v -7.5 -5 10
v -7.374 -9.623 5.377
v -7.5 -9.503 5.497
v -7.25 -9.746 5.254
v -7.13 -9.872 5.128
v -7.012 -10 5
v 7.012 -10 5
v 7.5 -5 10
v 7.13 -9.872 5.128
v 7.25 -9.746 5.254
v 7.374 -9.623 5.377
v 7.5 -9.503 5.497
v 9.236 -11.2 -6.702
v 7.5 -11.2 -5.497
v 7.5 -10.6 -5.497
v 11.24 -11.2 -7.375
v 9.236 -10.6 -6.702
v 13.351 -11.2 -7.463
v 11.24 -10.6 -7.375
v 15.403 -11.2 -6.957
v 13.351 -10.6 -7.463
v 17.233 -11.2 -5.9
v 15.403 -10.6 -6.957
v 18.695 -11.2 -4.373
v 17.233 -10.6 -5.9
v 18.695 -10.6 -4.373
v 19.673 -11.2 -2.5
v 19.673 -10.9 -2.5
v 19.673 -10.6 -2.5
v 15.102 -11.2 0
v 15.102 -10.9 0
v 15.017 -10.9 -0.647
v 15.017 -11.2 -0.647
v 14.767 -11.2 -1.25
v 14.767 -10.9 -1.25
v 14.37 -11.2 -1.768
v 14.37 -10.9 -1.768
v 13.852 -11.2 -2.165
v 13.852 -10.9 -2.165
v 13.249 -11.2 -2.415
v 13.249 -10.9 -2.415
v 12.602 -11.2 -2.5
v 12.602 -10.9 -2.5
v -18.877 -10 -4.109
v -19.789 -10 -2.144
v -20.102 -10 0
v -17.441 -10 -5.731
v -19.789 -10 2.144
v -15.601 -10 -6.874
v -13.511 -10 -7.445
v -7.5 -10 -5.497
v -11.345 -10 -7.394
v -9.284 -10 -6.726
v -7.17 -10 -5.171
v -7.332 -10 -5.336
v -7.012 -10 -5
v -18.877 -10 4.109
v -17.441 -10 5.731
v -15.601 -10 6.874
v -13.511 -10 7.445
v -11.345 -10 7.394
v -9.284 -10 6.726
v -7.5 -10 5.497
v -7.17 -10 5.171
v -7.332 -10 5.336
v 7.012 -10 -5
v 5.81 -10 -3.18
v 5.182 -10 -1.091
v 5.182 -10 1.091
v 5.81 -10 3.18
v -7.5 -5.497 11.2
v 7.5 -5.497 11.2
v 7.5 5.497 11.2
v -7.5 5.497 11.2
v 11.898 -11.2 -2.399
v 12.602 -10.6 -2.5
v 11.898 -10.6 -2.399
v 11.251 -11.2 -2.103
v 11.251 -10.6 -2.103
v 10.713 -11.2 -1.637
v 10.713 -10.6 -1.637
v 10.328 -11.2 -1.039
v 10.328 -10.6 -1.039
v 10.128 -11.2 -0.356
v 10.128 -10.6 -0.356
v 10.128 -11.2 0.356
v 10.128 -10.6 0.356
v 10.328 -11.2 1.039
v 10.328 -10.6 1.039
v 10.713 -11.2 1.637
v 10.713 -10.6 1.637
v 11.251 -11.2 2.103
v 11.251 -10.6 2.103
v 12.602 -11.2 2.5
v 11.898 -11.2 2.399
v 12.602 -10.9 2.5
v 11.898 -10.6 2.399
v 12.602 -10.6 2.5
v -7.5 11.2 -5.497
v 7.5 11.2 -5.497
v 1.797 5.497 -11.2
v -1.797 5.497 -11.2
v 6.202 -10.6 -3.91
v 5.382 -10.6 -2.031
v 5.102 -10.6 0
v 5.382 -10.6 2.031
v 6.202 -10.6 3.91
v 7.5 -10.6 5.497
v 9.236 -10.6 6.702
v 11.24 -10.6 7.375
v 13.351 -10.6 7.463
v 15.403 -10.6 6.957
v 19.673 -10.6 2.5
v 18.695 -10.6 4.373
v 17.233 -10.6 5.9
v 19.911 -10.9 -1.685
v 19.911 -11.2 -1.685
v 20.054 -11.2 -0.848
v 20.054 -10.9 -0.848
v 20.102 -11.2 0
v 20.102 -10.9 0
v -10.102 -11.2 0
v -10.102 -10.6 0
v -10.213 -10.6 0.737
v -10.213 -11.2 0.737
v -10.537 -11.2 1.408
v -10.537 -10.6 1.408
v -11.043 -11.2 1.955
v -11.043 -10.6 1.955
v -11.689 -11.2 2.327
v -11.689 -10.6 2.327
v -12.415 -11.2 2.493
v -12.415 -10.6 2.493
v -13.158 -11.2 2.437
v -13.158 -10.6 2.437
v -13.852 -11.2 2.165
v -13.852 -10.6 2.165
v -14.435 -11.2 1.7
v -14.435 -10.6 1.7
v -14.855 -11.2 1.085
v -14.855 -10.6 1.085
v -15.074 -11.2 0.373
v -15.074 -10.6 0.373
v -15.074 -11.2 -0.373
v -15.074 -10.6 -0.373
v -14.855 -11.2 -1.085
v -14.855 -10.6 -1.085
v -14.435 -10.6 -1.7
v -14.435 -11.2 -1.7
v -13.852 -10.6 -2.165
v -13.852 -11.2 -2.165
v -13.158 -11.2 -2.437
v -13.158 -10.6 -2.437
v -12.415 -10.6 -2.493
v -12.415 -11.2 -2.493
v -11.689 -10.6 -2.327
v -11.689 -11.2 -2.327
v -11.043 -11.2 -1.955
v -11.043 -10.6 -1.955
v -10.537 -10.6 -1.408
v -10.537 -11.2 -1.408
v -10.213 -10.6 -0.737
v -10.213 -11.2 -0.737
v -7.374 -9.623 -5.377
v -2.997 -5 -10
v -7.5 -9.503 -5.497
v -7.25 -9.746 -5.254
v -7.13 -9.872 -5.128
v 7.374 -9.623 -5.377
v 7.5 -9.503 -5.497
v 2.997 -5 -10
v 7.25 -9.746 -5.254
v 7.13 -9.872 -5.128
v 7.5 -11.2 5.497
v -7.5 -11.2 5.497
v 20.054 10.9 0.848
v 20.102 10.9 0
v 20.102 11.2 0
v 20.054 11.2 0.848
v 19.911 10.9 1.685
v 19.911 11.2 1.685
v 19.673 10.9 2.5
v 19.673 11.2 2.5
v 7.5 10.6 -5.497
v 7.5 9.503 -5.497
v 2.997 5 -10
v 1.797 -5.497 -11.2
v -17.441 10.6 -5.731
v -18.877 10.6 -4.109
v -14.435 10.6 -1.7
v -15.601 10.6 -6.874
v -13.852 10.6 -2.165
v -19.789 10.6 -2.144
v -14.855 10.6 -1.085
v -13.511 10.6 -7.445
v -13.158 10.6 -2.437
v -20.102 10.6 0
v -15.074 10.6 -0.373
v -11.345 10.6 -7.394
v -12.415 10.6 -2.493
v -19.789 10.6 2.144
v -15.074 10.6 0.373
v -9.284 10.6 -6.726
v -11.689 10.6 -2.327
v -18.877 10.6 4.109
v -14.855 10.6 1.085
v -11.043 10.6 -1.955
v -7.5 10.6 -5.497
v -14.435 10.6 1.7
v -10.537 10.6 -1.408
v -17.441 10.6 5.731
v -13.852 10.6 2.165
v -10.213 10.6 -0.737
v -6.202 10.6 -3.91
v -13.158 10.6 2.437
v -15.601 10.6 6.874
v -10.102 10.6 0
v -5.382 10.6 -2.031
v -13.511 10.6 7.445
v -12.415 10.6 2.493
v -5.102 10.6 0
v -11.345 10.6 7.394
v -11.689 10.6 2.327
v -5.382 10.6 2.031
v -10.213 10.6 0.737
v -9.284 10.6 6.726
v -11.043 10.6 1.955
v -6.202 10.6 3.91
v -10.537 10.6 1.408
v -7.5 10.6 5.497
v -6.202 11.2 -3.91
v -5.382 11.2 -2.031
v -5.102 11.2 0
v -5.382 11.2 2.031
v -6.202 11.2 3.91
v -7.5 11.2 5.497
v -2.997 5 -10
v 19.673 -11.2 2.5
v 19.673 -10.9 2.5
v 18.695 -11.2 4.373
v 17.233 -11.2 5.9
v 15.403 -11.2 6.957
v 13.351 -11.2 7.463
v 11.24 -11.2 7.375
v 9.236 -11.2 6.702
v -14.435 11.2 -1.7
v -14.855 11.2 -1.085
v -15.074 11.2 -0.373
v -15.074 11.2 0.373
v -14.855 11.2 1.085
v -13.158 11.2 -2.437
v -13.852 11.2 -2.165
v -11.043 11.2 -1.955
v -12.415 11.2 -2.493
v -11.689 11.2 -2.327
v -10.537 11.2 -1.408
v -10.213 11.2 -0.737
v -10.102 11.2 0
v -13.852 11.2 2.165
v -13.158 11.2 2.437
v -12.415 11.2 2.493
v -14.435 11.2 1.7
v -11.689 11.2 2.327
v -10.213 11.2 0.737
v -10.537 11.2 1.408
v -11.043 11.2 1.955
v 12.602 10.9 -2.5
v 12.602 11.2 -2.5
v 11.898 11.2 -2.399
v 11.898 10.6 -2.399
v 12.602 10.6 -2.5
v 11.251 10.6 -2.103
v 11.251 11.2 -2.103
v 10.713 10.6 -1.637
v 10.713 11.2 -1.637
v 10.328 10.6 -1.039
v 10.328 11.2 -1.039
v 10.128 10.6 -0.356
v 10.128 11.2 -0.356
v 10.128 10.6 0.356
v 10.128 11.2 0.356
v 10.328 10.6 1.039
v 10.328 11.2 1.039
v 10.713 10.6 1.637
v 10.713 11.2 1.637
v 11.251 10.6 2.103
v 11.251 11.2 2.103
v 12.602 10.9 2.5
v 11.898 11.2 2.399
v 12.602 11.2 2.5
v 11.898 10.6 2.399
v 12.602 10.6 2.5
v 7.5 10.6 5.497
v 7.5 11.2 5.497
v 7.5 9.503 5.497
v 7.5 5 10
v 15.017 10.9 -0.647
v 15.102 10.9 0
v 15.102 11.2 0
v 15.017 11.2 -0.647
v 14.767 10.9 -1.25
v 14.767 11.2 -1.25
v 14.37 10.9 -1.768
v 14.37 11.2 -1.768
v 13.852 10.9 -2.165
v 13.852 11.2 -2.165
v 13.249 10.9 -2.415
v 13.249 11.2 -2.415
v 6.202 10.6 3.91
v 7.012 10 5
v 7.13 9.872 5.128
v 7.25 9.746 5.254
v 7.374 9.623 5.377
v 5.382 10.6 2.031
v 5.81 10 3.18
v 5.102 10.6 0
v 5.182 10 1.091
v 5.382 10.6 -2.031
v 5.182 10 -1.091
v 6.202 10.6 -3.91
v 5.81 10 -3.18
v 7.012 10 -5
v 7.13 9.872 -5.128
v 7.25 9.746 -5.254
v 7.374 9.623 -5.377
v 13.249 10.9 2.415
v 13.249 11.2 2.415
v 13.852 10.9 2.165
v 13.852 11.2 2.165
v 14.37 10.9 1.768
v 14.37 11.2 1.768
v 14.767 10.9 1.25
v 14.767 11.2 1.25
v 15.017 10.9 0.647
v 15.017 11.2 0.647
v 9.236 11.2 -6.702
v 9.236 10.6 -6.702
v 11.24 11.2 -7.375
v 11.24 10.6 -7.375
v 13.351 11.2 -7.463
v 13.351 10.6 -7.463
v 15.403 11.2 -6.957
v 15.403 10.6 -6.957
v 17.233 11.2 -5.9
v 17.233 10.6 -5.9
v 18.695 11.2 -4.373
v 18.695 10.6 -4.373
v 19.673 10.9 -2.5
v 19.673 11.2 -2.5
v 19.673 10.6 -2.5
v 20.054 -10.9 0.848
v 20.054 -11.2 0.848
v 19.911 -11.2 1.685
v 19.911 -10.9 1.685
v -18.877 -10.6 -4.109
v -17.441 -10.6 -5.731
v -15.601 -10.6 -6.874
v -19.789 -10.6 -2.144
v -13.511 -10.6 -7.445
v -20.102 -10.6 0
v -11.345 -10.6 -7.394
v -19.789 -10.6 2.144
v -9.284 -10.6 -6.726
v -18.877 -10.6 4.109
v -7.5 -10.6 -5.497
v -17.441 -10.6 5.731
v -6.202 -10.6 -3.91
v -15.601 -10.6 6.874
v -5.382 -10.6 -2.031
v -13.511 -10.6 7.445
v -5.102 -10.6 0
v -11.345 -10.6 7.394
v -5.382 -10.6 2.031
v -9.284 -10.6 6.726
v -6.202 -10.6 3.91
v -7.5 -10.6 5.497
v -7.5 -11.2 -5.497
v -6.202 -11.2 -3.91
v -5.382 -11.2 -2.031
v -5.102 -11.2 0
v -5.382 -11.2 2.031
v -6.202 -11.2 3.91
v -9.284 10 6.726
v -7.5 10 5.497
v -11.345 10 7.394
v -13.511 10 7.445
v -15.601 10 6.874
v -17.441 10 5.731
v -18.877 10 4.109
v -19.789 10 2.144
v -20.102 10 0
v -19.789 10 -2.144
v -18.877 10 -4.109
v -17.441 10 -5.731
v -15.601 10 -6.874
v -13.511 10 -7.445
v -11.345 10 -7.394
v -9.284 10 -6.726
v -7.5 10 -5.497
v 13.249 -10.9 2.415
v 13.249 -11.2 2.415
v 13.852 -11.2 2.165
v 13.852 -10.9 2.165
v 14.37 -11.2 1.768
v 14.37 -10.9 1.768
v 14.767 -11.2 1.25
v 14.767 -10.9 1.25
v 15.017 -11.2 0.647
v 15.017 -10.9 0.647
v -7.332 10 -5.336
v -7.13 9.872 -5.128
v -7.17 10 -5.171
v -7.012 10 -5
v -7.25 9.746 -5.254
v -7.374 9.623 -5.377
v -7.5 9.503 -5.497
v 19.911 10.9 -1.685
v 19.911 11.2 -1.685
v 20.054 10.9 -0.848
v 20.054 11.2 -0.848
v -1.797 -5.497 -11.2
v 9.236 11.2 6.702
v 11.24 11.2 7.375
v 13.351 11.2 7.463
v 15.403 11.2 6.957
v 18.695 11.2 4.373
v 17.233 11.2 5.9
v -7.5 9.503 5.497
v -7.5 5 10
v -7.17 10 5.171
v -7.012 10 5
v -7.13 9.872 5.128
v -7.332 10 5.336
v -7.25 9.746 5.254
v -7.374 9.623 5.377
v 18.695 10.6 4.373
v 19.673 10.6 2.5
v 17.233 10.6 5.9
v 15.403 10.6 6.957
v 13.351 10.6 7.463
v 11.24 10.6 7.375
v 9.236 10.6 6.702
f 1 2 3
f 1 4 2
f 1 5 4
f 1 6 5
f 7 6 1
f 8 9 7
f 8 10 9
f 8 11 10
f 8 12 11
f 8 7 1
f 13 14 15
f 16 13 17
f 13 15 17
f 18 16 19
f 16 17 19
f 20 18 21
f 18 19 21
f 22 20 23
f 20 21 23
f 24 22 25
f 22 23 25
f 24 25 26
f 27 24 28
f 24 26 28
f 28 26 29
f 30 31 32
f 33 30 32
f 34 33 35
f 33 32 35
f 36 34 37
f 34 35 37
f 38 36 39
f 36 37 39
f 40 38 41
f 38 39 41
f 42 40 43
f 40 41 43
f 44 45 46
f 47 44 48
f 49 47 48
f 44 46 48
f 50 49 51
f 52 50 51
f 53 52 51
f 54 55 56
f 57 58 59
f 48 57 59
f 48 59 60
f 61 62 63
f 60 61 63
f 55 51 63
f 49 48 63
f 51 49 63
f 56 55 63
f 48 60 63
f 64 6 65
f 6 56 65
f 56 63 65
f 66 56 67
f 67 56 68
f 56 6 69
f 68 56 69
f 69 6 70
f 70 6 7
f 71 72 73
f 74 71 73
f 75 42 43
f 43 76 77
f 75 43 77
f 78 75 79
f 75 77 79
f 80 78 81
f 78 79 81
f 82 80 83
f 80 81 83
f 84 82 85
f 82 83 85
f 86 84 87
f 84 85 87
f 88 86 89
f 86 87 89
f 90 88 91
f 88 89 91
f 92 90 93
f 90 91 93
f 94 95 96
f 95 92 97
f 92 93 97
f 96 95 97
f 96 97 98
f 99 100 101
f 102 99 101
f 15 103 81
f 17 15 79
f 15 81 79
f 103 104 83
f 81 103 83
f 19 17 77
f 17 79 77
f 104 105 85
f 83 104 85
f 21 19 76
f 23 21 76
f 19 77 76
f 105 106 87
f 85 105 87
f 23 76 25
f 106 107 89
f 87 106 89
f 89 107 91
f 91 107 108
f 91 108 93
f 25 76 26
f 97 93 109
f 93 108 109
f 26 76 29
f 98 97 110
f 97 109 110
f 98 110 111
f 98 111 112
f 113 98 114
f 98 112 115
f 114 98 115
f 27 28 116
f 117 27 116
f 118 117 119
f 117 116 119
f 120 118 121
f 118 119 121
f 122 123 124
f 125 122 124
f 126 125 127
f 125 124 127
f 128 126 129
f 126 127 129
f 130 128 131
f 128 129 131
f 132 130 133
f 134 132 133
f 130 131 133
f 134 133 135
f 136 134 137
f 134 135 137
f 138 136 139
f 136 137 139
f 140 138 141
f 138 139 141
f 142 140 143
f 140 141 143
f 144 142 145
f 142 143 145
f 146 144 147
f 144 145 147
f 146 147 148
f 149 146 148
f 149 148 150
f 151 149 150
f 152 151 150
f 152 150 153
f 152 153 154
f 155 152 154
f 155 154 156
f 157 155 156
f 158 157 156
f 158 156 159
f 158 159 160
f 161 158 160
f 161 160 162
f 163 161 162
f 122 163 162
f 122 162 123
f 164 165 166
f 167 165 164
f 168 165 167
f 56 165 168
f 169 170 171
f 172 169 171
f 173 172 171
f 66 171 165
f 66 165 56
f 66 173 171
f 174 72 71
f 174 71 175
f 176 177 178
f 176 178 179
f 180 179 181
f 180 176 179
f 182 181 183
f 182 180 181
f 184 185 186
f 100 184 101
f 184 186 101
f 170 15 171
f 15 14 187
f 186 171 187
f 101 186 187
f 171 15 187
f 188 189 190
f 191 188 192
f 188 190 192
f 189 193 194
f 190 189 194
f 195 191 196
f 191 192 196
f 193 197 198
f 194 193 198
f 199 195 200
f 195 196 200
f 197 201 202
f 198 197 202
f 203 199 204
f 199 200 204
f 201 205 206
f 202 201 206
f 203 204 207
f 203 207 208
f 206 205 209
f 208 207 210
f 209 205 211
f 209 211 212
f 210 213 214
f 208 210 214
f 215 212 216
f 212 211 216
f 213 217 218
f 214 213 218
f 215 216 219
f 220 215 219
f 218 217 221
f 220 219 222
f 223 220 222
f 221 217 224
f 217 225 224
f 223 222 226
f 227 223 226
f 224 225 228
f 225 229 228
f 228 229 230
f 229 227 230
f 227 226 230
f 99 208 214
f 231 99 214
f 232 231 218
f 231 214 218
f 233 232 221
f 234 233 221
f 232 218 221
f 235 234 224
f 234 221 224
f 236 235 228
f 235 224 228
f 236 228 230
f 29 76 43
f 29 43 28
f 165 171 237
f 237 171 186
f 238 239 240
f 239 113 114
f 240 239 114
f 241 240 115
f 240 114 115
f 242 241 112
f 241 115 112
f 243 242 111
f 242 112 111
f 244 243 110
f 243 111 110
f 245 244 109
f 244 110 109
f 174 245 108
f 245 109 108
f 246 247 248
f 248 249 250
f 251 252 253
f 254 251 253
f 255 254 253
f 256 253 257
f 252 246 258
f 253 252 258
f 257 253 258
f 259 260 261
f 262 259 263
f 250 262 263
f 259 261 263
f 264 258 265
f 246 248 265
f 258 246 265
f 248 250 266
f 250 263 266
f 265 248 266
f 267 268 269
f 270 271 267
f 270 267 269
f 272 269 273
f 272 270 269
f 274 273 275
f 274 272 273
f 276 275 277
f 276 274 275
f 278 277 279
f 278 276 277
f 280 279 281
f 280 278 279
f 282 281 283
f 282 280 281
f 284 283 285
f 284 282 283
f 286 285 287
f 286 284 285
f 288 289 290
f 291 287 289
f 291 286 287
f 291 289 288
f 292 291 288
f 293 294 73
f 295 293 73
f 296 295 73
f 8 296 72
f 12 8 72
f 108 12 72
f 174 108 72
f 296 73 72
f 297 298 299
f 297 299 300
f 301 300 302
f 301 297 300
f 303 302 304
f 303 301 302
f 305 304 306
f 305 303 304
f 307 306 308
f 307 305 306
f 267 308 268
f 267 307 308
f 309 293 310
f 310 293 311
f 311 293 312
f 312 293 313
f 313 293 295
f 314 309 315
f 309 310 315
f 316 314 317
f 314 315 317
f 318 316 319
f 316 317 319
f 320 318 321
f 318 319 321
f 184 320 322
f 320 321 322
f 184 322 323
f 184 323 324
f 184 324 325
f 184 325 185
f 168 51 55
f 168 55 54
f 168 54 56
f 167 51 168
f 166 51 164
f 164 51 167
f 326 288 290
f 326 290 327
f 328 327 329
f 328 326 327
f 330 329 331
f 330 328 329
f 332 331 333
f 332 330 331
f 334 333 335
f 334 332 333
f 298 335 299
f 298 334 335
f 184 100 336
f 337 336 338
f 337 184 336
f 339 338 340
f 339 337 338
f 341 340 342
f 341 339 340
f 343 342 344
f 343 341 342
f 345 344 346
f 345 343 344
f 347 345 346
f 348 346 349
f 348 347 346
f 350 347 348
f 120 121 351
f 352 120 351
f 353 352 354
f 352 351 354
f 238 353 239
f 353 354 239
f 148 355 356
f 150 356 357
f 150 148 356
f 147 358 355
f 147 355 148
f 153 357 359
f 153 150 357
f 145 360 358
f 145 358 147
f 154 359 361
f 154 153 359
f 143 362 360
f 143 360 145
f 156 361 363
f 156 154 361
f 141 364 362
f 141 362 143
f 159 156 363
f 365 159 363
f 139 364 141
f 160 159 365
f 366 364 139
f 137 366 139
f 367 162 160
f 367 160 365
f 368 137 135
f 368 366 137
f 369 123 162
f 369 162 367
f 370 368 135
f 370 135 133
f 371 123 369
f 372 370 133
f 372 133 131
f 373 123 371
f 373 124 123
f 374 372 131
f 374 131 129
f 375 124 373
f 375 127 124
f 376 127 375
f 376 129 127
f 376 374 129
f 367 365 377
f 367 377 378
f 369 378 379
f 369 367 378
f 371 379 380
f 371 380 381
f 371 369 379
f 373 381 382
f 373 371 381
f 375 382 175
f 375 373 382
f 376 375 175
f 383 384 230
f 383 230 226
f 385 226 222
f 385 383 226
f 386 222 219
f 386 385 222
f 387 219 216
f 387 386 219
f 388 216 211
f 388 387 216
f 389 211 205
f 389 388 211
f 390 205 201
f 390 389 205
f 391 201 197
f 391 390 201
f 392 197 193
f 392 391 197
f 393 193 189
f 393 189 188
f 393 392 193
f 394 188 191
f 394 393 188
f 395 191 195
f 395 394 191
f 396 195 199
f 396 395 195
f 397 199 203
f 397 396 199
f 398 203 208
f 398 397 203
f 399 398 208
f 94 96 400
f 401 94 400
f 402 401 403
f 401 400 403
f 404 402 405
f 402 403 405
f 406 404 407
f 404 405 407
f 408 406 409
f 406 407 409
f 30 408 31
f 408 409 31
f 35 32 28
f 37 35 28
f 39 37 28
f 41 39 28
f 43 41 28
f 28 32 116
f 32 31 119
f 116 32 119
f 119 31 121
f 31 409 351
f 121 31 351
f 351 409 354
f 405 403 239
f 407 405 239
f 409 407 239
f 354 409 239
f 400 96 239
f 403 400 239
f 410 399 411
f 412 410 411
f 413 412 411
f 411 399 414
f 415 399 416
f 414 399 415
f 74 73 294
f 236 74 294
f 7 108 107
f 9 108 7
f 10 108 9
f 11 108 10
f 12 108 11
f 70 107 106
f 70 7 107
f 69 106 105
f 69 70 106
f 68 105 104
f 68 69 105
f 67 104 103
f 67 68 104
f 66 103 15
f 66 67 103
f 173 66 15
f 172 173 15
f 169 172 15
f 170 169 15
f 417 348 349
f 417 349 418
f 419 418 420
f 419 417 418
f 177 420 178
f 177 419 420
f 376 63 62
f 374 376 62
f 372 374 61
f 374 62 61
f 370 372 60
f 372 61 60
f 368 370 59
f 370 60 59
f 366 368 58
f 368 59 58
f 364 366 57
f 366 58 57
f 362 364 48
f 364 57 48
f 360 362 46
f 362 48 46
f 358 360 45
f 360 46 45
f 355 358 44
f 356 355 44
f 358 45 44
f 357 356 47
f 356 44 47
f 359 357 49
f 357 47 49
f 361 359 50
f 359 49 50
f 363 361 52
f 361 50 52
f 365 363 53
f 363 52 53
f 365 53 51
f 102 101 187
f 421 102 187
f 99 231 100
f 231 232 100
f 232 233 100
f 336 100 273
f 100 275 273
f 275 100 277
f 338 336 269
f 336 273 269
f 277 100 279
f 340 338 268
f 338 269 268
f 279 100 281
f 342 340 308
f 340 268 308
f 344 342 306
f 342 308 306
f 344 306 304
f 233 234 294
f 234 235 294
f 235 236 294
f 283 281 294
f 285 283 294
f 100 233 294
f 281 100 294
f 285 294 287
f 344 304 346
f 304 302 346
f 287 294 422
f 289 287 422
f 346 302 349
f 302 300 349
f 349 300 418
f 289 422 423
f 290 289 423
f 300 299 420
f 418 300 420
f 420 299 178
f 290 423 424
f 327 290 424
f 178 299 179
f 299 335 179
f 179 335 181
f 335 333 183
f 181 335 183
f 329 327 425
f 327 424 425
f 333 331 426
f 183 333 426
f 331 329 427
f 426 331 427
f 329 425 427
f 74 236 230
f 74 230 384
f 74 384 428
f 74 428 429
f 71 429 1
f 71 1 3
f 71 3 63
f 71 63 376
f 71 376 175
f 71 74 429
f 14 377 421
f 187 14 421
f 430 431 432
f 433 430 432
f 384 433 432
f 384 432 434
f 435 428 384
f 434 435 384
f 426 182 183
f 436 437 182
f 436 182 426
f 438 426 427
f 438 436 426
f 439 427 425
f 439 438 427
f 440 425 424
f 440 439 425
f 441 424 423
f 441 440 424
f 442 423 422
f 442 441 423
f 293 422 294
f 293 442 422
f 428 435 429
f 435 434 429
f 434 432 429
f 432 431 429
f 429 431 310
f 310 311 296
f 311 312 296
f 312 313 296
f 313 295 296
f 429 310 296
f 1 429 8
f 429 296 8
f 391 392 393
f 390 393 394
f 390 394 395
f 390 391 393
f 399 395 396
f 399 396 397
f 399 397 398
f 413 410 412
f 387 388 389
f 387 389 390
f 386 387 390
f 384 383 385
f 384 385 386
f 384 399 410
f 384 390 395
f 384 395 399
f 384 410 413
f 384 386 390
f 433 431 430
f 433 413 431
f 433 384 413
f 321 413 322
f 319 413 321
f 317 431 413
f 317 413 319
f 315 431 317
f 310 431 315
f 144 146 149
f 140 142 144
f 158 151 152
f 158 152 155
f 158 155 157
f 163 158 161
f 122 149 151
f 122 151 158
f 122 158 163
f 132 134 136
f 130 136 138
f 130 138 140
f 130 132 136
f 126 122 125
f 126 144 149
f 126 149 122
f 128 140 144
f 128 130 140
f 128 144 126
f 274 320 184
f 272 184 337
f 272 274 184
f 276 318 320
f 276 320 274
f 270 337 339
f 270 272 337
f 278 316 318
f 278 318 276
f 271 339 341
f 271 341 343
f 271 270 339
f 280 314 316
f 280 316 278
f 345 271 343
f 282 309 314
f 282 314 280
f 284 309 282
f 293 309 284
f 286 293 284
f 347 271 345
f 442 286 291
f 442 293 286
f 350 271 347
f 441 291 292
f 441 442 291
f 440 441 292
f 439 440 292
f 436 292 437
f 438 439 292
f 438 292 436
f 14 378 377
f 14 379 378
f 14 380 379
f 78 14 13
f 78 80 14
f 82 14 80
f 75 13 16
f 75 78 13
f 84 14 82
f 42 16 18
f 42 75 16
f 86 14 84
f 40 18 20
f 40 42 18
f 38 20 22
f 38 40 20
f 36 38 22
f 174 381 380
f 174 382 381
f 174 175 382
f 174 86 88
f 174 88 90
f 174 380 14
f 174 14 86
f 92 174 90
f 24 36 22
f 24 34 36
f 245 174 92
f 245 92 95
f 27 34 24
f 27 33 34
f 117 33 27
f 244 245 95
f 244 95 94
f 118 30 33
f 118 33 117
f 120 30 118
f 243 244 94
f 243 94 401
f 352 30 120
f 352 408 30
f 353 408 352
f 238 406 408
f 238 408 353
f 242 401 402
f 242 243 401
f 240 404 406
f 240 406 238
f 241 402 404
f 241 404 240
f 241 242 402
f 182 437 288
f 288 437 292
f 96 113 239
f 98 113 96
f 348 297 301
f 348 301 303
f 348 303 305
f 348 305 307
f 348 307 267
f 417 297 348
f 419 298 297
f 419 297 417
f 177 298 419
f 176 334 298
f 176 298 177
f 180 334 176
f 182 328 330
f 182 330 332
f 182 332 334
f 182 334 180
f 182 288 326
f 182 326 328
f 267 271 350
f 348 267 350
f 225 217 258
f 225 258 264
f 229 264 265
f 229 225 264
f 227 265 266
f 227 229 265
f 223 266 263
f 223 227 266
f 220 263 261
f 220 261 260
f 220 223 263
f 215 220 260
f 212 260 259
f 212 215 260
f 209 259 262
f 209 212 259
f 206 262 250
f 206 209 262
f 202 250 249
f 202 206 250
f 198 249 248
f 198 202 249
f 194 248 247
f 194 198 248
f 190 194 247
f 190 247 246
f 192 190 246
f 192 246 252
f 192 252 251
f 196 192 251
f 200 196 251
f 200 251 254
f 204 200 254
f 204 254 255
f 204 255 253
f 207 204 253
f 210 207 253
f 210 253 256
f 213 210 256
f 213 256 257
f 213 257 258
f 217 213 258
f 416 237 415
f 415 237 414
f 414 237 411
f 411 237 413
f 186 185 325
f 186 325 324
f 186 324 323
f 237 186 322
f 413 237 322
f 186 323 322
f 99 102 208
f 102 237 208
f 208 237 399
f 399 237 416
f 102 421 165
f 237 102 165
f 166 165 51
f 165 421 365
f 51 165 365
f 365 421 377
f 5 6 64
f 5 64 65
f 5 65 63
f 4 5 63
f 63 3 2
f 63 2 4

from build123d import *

# Parameters (mm, degrees)
F1_DEPTH  = 7.5
F2_R      = 7.5
F2_R_2    = 2.5
F3_DEPTH  = 11.2
F4_DEPTH  = 11.2
F5_DEPTH  = 10.6
F6_DEPTH  = 10.9
F7_DEPTH  = 10.6
F8_DEPTH  = 11.2
F9_DEPTH  = 10
F12_DEPTH = 22.4


with BuildPart() as f1:
    # F0 (on Right) → F1 (new body, symmetric)
    with BuildSketch(Plane.YZ):
        Polygon((-5, 10), (0, 10), (0, 11.2), (-5.497056, 11.2), (-11.2, 5.497056), (-11.2, -5.497056), (-5.497056, -11.2), (0, -11.2), (0, -10), (-5, -10), (-10, -5), (-10, 5), align=None)
    extrude(amount=F1_DEPTH, both=True)

    # F2 (on Front) → F3 (cut)
    with BuildSketch(Plane.XZ):
        with Locations((-12.602193, 0)):
            Circle(F2_R)
        with Locations((-12.602193, 0)):
            Circle(F2_R_2, mode=Mode.SUBTRACT)
        with BuildLine():
            Line((12.602193, 2.5), (19.673261, 2.5))
            ThreePointArc((19.673261, 2.5), (5.102193, 0), (19.673261, -2.5))
            Line((19.673261, -2.5), (12.602193, -2.5))
            ThreePointArc((12.602193, -2.5), (10.102193, 0), (12.602193, 2.5))
        make_face()
    extrude(amount=F3_DEPTH, mode=Mode.SUBTRACT)

    # F2 (on Front) → F4 (join)
    with BuildSketch(Plane.XZ):
        with BuildLine():
            Line((12.602193, 2.5), (19.673261, 2.5))
            ThreePointArc((19.673261, 2.5), (5.102193, 0), (19.673261, -2.5))
            Line((19.673261, -2.5), (12.602193, -2.5))
            ThreePointArc((12.602193, -2.5), (10.102193, 0), (12.602193, 2.5))
        make_face()
        with BuildLine():
            ThreePointArc((19.673261, -2.5), (19.994182, -1.268265), (20.102193, 0))
            ThreePointArc((20.102193, 0), (19.994182, 1.268265), (19.673261, 2.5))
            Line((19.673261, 2.5), (12.602193, 2.5))
            ThreePointArc((12.602193, 2.5), (14.36996, 1.767767), (15.102193, 0))
            ThreePointArc((15.102193, 0), (14.36996, -1.767767), (12.602193, -2.5))
            Line((12.602193, -2.5), (19.673261, -2.5))
        make_face()
    extrude(amount=F4_DEPTH)

    # F2 (on Front) → F5 (cut)
    with BuildSketch(Plane.XZ):
        with BuildLine():
            Line((12.602193, 2.5), (19.673261, 2.5))
            ThreePointArc((19.673261, 2.5), (5.102193, 0), (19.673261, -2.5))
            Line((19.673261, -2.5), (12.602193, -2.5))
            ThreePointArc((12.602193, -2.5), (10.102193, 0), (12.602193, 2.5))
        make_face()
        with BuildLine():
            ThreePointArc((19.673261, -2.5), (19.994182, -1.268265), (20.102193, 0))
            ThreePointArc((20.102193, 0), (19.994182, 1.268265), (19.673261, 2.5))
            Line((19.673261, 2.5), (12.602193, 2.5))
            ThreePointArc((12.602193, 2.5), (14.36996, 1.767767), (15.102193, 0))
            ThreePointArc((15.102193, 0), (14.36996, -1.767767), (12.602193, -2.5))
            Line((12.602193, -2.5), (19.673261, -2.5))
        make_face()
        with BuildLine():
            ThreePointArc((15.102193, 0), (14.36996, 1.767767), (12.602193, 2.5))
            ThreePointArc((12.602193, 2.5), (10.102193, 0), (12.602193, -2.5))
            ThreePointArc((12.602193, -2.5), (14.36996, -1.767767), (15.102193, 0))
        make_face()
    extrude(amount=F5_DEPTH, mode=Mode.SUBTRACT)

    # F2 (on Front) → F6 (cut)
    with BuildSketch(Plane.XZ):
        with BuildLine():
            ThreePointArc((15.102193, 0), (14.36996, 1.767767), (12.602193, 2.5))
            ThreePointArc((12.602193, 2.5), (10.102193, 0), (12.602193, -2.5))
            ThreePointArc((12.602193, -2.5), (14.36996, -1.767767), (15.102193, 0))
        make_face()
        with BuildLine():
            ThreePointArc((19.673261, -2.5), (19.994182, -1.268265), (20.102193, 0))
            ThreePointArc((20.102193, 0), (19.994182, 1.268265), (19.673261, 2.5))
            Line((19.673261, 2.5), (12.602193, 2.5))
            ThreePointArc((12.602193, 2.5), (14.36996, 1.767767), (15.102193, 0))
            ThreePointArc((15.102193, 0), (14.36996, -1.767767), (12.602193, -2.5))
            Line((12.602193, -2.5), (19.673261, -2.5))
        make_face()
    extrude(amount=F6_DEPTH, mode=Mode.SUBTRACT)

    # F2 (on Front) → F7 (join)
    with BuildSketch(Plane.XZ):
        with Locations((-12.602193, 0)):
            Circle(F2_R)
        with Locations((-12.602193, 0)):
            Circle(F2_R_2, mode=Mode.SUBTRACT)
    extrude(amount=F7_DEPTH)

    # F2 (on Front) → F8 (join)
    with BuildSketch(Plane.XZ):
        with Locations((-12.602193, 0)):
            Circle(F2_R_2)
    extrude(amount=F8_DEPTH)

    # F2 (on Front) → F9 (cut)
    with BuildSketch(Plane.XZ):
        with Locations((-12.602193, 0)):
            Circle(F2_R)
        with Locations((-12.602193, 0)):
            Circle(F2_R_2, mode=Mode.SUBTRACT)
        with Locations((-12.602193, 0)):
            Circle(F2_R_2)
    extrude(amount=F9_DEPTH, mode=Mode.SUBTRACT)

    # F10: F1 across plane


with BuildPart() as f1_1:
    add(f1.part)
    add(f1.part.mirror(Plane.XZ))

    # F11 (on face) → F12 (cut)
    with BuildSketch(Plane.XZ.offset(11.2)):
        Polygon((7.5, -11.2), (7.5, -5.497056), (1.797056, -11.2), align=None)
        Polygon((-1.797056, -11.2), (-7.5, -5.497056), (-7.5, -11.2), align=None)
    extrude(amount=-F12_DEPTH, mode=Mode.SUBTRACT)


solid = f1_1.part
